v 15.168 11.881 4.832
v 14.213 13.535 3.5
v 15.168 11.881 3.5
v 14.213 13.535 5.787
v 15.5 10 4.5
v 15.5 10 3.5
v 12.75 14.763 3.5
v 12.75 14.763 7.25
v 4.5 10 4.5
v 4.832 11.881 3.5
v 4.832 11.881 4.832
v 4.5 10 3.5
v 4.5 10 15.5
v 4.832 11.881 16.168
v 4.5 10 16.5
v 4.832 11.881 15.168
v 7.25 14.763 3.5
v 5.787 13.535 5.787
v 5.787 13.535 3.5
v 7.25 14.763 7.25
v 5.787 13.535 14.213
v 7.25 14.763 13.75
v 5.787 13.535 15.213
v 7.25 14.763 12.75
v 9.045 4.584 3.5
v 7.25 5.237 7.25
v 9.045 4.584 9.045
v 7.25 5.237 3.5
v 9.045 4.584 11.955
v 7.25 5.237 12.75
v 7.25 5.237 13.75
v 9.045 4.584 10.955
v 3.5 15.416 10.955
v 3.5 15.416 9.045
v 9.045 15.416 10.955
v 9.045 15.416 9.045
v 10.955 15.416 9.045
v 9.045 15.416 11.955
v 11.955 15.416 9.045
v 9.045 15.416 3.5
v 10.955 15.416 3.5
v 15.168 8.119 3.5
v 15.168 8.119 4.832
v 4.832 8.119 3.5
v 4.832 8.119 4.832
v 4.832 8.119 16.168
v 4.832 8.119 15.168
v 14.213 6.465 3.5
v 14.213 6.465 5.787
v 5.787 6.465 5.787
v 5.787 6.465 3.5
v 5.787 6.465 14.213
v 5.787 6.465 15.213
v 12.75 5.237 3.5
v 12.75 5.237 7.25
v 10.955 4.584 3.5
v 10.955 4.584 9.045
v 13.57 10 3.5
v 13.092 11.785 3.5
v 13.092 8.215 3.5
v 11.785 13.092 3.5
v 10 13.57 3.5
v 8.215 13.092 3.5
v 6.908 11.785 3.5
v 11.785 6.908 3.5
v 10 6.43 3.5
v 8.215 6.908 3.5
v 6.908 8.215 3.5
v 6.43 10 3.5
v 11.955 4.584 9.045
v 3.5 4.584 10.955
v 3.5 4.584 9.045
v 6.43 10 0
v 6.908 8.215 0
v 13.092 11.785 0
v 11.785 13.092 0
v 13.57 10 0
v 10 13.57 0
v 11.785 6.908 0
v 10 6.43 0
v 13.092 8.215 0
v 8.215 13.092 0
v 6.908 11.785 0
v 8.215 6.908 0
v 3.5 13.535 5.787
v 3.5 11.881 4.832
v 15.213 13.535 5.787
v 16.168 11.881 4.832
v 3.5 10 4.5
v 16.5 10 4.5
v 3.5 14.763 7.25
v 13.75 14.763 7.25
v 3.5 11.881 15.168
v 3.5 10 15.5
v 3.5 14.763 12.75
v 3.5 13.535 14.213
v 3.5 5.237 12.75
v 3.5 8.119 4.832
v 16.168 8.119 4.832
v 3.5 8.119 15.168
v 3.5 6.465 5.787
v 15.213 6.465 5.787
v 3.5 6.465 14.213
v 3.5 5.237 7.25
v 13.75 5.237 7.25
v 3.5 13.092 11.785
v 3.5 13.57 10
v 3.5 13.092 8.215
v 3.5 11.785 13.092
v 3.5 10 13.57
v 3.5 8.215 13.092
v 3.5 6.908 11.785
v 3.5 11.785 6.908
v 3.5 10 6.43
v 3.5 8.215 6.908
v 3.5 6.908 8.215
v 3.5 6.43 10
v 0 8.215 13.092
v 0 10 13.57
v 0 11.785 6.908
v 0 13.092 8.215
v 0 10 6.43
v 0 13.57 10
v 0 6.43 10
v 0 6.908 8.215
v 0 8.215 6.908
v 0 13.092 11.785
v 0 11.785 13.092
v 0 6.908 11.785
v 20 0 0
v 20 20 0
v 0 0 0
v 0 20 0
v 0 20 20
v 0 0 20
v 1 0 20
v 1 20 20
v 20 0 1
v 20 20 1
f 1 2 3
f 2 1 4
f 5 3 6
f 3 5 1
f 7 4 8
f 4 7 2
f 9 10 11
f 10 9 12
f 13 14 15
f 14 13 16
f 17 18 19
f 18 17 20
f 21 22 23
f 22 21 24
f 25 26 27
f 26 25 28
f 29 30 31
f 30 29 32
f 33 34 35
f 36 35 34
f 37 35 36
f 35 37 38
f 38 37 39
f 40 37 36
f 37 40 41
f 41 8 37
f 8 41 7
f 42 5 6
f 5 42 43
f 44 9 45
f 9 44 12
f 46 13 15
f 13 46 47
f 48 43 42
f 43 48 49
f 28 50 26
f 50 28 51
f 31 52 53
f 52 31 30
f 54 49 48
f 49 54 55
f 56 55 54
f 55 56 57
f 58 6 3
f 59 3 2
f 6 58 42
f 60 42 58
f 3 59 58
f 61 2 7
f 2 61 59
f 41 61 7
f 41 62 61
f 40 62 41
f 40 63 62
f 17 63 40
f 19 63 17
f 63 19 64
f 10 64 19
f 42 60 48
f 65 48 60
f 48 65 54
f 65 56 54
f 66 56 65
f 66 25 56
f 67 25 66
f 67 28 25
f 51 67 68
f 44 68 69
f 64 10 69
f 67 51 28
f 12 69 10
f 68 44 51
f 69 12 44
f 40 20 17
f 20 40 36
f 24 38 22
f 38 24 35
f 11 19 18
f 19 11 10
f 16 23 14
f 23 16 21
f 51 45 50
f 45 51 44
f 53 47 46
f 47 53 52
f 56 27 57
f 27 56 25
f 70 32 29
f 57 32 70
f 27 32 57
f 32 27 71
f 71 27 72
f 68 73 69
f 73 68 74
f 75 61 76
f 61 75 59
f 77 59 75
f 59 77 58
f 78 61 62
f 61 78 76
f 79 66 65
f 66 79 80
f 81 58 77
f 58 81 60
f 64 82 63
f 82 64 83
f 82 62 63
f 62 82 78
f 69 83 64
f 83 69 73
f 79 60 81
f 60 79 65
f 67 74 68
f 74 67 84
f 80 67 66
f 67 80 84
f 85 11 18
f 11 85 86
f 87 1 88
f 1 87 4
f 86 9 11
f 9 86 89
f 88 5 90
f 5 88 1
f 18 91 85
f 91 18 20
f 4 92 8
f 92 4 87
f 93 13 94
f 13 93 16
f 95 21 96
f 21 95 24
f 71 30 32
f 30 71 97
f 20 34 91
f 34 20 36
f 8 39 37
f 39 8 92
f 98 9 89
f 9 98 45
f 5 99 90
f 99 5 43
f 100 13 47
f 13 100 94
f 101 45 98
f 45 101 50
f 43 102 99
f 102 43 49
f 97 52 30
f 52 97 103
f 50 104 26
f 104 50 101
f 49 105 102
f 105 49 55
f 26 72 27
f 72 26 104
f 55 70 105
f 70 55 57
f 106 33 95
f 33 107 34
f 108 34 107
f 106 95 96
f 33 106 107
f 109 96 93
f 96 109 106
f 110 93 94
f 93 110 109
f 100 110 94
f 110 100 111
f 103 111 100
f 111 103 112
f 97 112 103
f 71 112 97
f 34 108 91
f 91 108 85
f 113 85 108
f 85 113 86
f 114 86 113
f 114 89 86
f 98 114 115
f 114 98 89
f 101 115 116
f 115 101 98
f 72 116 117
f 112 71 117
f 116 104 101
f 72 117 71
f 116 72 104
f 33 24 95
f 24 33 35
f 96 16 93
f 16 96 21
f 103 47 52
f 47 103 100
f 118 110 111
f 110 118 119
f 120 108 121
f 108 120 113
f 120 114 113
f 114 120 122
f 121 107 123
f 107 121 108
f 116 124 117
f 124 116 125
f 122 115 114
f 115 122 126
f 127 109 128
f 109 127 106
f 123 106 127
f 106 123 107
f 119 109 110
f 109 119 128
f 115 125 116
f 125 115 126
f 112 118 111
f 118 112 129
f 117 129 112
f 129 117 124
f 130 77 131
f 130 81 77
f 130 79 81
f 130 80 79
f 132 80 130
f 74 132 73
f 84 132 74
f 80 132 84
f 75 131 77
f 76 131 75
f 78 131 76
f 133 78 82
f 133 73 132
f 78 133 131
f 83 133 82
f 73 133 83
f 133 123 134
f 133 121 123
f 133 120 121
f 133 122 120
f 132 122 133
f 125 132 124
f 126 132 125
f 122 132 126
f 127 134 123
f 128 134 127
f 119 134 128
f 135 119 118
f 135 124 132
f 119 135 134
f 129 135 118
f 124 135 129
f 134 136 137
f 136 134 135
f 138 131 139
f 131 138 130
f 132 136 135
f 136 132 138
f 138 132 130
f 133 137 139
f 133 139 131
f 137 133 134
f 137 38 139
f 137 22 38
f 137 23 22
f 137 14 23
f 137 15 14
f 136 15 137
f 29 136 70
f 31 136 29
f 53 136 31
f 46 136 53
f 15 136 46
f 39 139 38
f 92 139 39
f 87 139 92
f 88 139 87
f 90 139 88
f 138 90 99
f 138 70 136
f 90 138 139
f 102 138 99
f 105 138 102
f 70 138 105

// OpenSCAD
// file: ../scad/bom.scad
module bom(code, desc, category) {
	echo(str(
    "BOM: { \"code\" : \"",
    code,
    "\", \"description\" : \"",
    desc,
    "\", \"categories\" : ",
    category,
    " }"
  ));
}
// file: ../scad/brackets.scad
include <MCAD/materials.scad>;
include <bom.scad>;

module angle_corner_connector() {
  r1 = 5.5;
  r2 = 3.57;
  d  = 3.5;
  AnodizedBlack = [0.17, 0.17, 0.2];
  bom("ob-angle-corner-connector", "Angle Cotner Connector", ["bracket", "hardware"]);
  color(AnodizedBlack) {
    difference() {
      rotate([90,0,0])
        translate([0,0,-20])
          linear_extrude(height=20)
            polygon(points=[[0,0],[20,0],[20,1],[1,20],[0,20]], paths=[[0,1,2,3,4]]);
      rotate([0,0,0]) {
        translate([10,10,d]) {
          cylinder(30, r1, r1);
          translate([0,0,-2*d])
            cylinder(30, r2, r2);
        }
      }


      rotate([0,90,0]) {
        translate([-10,10,d]) {
          cylinder(30, r1, r1);
          translate([0,0,-2*d])
            cylinder(30, r2, r2);
        }
      }
    }
  }
}

module brackets_test() {
  angle_corner_connector();
}
// main file
use <../scad/brackets.scad>

//rotate_y_at(90, [10,10])
  angle_corner_connector();
